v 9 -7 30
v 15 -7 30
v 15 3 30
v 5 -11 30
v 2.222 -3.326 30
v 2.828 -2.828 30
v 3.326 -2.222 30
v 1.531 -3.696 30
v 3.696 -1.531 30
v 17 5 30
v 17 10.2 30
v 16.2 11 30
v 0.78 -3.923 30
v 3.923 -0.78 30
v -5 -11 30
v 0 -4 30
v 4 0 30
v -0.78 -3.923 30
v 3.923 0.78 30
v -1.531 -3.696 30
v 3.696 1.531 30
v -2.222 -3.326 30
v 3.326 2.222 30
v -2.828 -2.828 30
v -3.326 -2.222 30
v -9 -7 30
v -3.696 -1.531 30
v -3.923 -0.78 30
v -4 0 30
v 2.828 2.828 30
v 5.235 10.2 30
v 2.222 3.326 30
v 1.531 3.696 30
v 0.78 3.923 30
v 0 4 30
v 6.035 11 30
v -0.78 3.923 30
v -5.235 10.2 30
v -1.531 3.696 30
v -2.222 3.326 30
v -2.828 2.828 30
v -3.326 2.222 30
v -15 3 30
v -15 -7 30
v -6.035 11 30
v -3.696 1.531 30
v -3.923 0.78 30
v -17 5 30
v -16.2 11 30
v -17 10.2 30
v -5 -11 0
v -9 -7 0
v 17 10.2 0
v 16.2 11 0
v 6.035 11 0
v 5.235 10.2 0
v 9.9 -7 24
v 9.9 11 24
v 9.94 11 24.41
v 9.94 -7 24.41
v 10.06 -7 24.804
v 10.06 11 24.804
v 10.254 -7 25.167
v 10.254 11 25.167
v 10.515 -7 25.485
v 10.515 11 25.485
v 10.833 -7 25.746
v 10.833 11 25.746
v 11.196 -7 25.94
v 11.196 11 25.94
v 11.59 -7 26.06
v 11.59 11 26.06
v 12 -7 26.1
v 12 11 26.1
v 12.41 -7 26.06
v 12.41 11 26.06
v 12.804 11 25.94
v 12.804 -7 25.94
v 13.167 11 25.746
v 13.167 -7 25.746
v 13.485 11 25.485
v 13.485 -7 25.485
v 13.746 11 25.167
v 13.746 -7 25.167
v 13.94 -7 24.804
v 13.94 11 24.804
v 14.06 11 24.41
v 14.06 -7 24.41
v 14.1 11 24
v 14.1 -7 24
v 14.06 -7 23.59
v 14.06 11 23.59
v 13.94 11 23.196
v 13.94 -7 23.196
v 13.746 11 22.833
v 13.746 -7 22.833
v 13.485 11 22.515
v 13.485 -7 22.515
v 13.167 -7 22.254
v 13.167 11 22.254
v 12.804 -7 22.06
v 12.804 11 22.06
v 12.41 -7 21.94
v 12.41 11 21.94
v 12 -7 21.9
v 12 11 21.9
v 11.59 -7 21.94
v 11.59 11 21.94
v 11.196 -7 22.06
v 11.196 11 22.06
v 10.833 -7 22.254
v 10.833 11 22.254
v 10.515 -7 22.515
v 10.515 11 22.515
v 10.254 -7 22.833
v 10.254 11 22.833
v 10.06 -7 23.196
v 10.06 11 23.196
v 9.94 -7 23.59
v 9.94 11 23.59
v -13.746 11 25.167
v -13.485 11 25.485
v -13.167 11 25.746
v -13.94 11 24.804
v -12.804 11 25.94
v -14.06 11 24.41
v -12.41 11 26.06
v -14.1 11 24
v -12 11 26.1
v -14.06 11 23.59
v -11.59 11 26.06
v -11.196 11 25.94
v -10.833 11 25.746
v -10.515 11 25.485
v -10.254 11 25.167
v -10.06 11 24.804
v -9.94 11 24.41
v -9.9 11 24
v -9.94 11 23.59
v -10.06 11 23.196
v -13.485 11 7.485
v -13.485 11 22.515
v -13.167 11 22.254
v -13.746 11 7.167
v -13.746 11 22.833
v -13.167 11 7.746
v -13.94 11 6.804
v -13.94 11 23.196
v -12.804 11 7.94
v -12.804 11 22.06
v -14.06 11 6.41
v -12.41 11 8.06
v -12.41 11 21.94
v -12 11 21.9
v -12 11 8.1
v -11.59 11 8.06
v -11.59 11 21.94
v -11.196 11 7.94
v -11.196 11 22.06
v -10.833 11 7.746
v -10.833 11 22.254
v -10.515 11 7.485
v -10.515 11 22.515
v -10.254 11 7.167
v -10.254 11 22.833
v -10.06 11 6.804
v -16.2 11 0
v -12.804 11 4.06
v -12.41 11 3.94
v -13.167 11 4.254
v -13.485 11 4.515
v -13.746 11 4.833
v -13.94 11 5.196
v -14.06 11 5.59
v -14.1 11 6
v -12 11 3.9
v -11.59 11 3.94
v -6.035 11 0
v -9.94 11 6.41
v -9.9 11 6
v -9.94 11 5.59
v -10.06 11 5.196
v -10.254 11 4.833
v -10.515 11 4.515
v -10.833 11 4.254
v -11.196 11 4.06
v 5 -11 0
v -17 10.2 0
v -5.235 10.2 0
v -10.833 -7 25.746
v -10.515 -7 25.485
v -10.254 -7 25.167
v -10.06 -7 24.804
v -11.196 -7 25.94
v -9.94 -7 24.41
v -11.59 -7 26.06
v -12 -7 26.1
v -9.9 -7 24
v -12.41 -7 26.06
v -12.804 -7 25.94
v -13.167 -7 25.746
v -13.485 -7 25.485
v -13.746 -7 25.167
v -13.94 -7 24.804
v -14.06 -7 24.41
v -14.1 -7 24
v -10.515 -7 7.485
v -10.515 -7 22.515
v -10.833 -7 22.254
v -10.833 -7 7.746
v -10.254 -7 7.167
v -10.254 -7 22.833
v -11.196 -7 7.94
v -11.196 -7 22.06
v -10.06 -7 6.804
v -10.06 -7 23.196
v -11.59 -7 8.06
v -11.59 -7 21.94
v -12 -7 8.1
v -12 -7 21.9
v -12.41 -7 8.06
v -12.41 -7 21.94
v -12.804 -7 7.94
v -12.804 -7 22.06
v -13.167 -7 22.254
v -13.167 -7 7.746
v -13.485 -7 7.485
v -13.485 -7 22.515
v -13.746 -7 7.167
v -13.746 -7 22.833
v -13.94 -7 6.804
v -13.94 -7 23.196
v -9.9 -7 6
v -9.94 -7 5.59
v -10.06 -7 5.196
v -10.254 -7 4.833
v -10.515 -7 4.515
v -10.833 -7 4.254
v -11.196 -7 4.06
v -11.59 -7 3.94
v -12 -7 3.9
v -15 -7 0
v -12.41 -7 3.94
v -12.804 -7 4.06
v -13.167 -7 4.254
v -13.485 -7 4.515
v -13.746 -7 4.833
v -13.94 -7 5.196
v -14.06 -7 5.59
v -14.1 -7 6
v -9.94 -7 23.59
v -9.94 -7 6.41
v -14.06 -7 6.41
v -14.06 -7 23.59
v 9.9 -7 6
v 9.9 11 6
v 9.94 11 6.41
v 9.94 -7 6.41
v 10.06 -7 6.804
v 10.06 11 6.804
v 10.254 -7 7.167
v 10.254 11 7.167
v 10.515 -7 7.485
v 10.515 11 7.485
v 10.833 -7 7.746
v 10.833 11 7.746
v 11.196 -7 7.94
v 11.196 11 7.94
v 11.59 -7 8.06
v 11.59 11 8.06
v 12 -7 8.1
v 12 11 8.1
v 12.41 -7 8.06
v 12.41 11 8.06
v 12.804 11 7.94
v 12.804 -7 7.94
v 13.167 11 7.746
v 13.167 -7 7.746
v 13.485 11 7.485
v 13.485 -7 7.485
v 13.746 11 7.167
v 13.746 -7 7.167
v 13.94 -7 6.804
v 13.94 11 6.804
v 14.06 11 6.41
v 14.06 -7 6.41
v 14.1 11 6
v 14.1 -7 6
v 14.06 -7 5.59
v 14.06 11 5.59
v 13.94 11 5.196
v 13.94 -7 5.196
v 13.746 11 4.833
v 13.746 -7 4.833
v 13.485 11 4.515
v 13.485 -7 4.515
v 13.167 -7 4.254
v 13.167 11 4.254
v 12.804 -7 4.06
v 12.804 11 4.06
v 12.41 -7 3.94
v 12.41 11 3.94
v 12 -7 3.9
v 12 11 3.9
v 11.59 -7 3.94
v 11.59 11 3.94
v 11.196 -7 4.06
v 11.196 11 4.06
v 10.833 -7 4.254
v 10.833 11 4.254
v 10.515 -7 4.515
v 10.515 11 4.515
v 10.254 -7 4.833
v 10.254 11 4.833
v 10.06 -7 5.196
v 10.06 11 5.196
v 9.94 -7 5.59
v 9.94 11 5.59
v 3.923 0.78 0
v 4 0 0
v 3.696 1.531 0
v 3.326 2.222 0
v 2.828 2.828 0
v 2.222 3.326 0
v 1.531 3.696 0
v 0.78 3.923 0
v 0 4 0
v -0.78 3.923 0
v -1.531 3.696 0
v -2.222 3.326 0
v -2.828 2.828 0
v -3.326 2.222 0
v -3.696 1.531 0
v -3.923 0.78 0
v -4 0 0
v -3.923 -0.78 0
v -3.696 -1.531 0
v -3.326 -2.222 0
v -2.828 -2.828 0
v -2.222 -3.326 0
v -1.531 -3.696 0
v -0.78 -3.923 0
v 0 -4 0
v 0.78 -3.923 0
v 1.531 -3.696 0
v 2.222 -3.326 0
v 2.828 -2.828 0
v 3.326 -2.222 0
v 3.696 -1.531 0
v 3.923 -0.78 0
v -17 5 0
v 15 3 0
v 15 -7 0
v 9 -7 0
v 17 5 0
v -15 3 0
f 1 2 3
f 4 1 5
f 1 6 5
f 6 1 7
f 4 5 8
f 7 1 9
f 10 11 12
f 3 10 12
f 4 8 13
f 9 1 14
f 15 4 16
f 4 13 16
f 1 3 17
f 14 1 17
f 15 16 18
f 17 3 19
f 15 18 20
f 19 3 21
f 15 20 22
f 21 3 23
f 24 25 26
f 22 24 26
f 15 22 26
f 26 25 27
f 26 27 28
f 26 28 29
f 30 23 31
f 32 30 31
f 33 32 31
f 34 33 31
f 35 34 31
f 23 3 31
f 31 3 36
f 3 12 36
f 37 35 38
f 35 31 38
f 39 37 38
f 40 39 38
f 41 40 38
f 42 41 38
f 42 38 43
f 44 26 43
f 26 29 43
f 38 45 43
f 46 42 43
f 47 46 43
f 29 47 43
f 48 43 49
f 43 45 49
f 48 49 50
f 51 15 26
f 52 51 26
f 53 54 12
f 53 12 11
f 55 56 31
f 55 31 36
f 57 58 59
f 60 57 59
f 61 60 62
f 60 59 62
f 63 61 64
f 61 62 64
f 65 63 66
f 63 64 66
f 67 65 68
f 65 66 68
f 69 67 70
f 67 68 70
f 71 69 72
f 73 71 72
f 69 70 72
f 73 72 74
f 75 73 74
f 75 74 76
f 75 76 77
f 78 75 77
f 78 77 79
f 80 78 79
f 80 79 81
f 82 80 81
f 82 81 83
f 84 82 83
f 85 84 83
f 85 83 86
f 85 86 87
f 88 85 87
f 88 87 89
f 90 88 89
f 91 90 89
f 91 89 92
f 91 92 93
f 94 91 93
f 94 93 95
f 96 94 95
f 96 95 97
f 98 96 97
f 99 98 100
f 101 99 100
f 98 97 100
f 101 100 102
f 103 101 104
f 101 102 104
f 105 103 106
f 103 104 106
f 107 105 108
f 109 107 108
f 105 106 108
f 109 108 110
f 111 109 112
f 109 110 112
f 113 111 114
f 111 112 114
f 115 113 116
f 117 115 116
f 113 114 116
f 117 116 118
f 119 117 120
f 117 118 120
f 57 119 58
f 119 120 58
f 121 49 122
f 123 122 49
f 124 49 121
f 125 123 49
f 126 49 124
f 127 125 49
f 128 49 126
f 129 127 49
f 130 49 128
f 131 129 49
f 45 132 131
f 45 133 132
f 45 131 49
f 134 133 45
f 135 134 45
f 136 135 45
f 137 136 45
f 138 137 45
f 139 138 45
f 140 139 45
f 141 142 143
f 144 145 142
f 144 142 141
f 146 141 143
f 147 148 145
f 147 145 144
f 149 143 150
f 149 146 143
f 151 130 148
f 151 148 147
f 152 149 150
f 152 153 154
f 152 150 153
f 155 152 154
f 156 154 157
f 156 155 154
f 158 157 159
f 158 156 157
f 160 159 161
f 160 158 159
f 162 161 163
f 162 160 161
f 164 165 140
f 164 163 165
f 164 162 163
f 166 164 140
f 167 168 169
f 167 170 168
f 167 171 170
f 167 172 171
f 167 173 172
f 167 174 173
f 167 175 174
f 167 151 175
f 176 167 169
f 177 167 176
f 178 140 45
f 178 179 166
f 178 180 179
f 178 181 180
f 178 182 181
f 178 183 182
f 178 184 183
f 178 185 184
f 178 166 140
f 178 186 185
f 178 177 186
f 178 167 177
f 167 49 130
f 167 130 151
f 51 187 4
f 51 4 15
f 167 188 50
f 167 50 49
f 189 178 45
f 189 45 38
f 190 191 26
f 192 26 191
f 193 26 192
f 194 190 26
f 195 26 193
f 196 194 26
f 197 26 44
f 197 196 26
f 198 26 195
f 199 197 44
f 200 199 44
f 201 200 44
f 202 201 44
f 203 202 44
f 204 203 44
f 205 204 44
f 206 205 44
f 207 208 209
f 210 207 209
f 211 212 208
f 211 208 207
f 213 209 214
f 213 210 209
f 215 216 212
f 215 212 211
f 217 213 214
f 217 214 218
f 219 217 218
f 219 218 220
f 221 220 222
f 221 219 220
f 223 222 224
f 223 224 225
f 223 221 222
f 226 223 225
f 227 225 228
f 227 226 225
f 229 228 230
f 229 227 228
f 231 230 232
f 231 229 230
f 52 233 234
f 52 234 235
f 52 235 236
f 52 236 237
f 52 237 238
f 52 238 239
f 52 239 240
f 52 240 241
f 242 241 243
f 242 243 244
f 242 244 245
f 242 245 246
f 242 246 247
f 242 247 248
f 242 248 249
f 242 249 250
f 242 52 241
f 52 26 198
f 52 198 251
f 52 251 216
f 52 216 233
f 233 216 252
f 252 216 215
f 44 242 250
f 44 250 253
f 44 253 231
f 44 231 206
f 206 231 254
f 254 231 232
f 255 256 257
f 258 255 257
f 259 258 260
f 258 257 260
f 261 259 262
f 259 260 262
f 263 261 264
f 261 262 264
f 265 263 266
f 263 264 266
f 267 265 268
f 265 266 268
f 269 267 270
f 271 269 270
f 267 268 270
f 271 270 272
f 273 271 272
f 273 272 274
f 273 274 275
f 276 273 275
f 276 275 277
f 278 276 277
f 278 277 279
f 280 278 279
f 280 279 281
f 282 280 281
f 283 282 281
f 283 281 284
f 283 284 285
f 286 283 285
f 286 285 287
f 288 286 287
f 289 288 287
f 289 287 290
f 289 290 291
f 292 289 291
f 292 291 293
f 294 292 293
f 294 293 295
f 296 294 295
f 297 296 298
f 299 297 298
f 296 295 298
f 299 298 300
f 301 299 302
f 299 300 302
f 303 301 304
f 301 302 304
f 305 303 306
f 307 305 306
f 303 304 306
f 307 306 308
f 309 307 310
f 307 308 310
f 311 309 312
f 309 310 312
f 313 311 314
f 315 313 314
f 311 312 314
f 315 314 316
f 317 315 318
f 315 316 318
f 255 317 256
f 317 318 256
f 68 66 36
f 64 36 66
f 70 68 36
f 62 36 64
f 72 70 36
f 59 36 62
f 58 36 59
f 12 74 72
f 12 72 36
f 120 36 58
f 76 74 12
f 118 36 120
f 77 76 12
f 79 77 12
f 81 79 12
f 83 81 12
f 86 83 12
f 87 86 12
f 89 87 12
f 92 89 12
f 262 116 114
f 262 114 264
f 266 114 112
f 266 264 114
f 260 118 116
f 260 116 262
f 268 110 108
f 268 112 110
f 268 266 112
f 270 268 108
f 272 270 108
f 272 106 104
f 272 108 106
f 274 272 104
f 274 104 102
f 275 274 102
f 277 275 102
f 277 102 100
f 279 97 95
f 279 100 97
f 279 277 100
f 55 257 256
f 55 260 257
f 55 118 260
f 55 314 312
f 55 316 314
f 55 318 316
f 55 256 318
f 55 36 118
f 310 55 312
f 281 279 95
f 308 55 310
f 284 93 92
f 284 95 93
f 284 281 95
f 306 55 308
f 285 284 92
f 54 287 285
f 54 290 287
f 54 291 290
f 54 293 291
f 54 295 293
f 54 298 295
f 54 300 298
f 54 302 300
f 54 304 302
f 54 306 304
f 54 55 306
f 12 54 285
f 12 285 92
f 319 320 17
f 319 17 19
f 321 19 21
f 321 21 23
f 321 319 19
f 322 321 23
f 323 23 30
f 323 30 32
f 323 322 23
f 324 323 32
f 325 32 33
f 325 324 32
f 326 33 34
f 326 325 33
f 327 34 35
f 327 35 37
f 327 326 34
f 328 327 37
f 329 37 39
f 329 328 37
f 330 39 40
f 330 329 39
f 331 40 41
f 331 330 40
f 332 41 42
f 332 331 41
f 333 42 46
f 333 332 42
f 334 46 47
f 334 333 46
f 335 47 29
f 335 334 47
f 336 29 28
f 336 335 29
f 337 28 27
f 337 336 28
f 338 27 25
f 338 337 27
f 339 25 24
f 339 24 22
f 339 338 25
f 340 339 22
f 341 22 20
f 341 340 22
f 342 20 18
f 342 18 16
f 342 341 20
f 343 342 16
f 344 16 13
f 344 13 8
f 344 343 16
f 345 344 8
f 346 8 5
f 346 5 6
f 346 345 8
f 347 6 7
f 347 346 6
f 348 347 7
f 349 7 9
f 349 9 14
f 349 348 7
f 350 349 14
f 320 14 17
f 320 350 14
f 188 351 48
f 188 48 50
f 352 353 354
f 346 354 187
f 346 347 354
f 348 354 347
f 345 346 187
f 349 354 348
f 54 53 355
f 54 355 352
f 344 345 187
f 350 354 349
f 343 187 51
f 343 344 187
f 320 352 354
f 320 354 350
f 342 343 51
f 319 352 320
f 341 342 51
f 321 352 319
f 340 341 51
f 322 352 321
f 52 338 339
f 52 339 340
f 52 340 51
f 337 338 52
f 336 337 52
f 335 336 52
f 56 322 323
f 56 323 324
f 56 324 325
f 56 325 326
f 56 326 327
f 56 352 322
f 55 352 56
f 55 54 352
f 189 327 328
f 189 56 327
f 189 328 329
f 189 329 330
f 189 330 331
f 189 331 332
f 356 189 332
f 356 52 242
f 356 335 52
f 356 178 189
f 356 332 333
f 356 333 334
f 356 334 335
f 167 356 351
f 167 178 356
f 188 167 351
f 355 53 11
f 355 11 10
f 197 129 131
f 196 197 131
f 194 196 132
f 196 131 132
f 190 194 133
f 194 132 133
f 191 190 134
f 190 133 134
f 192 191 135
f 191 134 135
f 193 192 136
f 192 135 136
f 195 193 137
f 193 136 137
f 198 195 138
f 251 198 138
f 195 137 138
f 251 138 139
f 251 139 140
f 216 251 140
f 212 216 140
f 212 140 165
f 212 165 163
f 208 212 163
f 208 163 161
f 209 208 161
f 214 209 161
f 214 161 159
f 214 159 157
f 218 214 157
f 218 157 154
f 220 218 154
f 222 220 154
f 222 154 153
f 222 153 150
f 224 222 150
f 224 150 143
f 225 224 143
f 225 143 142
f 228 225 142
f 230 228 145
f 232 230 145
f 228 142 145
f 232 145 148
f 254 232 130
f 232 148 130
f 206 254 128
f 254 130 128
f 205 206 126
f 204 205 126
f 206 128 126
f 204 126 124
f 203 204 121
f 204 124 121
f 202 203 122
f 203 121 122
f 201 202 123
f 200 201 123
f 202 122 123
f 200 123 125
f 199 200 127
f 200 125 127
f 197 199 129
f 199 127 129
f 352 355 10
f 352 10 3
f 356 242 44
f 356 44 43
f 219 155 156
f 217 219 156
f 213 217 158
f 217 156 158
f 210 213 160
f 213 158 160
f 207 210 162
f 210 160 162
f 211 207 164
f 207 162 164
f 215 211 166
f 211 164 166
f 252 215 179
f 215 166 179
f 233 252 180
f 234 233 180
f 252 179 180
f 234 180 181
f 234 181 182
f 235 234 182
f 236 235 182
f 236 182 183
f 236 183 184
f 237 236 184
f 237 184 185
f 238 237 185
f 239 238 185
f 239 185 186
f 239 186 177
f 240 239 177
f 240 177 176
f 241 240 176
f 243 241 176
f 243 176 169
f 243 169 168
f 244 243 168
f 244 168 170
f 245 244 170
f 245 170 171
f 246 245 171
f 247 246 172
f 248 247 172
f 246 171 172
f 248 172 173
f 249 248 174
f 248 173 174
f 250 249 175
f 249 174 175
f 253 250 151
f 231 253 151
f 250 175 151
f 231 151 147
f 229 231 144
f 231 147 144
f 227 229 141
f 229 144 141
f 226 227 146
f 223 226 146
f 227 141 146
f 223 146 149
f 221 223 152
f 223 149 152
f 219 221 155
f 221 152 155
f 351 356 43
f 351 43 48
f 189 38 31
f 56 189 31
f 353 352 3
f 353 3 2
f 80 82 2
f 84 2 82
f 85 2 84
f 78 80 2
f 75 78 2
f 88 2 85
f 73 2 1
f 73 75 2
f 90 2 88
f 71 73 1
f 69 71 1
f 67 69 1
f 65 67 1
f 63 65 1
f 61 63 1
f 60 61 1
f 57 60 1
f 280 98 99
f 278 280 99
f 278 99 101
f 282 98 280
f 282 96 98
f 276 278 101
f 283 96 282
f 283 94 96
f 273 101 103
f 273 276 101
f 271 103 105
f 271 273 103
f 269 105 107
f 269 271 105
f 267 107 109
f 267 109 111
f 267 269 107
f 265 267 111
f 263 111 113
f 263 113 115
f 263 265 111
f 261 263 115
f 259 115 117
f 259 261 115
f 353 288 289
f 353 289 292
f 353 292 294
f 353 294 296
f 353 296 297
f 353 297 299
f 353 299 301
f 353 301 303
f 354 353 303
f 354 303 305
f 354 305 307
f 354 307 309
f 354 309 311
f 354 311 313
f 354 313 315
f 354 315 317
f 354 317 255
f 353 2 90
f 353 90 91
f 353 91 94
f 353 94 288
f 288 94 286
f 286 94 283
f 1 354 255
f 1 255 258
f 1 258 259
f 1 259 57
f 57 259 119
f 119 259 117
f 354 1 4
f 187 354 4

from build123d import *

# Parameters (mm, degrees)
SKETCH_1_R          = 4
EXTRUDE_1_DEPTH     = 30
SKETCH_2_R          = 2.1
CUT_EXTRUDE_1_DEPTH = 30


with BuildPart() as part:
    # 草图1 → 凸台-拉伸1 (new body)
    with BuildSketch(Plane.XY):
        Polygon((5, -11), (-5, -11), (-9, -7), (-15, -7), (-15, 3), (-17, 5), (-17, 10.2), (-16.2, 11), (-6.034999107, 11), (-5.234999107, 10.2), (5.234999107, 10.2), (6.034999107, 11), (16.2, 11), (17, 10.2), (17, 5), (15, 3), (15, -7), (9, -7), align=None)
        Circle(SKETCH_1_R, mode=Mode.SUBTRACT)
    extrude(amount=EXTRUDE_1_DEPTH)

    # 草图2 → 切除-拉伸1 (cut)
    with BuildSketch(Plane(origin=(0, 11, 0), x_dir=(1, 0, 0), z_dir=(0, 1, 0))):
        with Locations(Location((-12, -6, 0), (0, 0, 270))):
            Circle(SKETCH_2_R)
        with Locations(Location((-12, -24, 0), (0, 0, 270))):
            Circle(SKETCH_2_R)
        with Locations(Location((12, -6, 0), (0, 0, 180))):
            Circle(SKETCH_2_R)
        with Locations(Location((12, -24, 0), (0, 0, 180))):
            Circle(SKETCH_2_R)
    extrude(amount=-CUT_EXTRUDE_1_DEPTH, mode=Mode.SUBTRACT)


solid = part.part
